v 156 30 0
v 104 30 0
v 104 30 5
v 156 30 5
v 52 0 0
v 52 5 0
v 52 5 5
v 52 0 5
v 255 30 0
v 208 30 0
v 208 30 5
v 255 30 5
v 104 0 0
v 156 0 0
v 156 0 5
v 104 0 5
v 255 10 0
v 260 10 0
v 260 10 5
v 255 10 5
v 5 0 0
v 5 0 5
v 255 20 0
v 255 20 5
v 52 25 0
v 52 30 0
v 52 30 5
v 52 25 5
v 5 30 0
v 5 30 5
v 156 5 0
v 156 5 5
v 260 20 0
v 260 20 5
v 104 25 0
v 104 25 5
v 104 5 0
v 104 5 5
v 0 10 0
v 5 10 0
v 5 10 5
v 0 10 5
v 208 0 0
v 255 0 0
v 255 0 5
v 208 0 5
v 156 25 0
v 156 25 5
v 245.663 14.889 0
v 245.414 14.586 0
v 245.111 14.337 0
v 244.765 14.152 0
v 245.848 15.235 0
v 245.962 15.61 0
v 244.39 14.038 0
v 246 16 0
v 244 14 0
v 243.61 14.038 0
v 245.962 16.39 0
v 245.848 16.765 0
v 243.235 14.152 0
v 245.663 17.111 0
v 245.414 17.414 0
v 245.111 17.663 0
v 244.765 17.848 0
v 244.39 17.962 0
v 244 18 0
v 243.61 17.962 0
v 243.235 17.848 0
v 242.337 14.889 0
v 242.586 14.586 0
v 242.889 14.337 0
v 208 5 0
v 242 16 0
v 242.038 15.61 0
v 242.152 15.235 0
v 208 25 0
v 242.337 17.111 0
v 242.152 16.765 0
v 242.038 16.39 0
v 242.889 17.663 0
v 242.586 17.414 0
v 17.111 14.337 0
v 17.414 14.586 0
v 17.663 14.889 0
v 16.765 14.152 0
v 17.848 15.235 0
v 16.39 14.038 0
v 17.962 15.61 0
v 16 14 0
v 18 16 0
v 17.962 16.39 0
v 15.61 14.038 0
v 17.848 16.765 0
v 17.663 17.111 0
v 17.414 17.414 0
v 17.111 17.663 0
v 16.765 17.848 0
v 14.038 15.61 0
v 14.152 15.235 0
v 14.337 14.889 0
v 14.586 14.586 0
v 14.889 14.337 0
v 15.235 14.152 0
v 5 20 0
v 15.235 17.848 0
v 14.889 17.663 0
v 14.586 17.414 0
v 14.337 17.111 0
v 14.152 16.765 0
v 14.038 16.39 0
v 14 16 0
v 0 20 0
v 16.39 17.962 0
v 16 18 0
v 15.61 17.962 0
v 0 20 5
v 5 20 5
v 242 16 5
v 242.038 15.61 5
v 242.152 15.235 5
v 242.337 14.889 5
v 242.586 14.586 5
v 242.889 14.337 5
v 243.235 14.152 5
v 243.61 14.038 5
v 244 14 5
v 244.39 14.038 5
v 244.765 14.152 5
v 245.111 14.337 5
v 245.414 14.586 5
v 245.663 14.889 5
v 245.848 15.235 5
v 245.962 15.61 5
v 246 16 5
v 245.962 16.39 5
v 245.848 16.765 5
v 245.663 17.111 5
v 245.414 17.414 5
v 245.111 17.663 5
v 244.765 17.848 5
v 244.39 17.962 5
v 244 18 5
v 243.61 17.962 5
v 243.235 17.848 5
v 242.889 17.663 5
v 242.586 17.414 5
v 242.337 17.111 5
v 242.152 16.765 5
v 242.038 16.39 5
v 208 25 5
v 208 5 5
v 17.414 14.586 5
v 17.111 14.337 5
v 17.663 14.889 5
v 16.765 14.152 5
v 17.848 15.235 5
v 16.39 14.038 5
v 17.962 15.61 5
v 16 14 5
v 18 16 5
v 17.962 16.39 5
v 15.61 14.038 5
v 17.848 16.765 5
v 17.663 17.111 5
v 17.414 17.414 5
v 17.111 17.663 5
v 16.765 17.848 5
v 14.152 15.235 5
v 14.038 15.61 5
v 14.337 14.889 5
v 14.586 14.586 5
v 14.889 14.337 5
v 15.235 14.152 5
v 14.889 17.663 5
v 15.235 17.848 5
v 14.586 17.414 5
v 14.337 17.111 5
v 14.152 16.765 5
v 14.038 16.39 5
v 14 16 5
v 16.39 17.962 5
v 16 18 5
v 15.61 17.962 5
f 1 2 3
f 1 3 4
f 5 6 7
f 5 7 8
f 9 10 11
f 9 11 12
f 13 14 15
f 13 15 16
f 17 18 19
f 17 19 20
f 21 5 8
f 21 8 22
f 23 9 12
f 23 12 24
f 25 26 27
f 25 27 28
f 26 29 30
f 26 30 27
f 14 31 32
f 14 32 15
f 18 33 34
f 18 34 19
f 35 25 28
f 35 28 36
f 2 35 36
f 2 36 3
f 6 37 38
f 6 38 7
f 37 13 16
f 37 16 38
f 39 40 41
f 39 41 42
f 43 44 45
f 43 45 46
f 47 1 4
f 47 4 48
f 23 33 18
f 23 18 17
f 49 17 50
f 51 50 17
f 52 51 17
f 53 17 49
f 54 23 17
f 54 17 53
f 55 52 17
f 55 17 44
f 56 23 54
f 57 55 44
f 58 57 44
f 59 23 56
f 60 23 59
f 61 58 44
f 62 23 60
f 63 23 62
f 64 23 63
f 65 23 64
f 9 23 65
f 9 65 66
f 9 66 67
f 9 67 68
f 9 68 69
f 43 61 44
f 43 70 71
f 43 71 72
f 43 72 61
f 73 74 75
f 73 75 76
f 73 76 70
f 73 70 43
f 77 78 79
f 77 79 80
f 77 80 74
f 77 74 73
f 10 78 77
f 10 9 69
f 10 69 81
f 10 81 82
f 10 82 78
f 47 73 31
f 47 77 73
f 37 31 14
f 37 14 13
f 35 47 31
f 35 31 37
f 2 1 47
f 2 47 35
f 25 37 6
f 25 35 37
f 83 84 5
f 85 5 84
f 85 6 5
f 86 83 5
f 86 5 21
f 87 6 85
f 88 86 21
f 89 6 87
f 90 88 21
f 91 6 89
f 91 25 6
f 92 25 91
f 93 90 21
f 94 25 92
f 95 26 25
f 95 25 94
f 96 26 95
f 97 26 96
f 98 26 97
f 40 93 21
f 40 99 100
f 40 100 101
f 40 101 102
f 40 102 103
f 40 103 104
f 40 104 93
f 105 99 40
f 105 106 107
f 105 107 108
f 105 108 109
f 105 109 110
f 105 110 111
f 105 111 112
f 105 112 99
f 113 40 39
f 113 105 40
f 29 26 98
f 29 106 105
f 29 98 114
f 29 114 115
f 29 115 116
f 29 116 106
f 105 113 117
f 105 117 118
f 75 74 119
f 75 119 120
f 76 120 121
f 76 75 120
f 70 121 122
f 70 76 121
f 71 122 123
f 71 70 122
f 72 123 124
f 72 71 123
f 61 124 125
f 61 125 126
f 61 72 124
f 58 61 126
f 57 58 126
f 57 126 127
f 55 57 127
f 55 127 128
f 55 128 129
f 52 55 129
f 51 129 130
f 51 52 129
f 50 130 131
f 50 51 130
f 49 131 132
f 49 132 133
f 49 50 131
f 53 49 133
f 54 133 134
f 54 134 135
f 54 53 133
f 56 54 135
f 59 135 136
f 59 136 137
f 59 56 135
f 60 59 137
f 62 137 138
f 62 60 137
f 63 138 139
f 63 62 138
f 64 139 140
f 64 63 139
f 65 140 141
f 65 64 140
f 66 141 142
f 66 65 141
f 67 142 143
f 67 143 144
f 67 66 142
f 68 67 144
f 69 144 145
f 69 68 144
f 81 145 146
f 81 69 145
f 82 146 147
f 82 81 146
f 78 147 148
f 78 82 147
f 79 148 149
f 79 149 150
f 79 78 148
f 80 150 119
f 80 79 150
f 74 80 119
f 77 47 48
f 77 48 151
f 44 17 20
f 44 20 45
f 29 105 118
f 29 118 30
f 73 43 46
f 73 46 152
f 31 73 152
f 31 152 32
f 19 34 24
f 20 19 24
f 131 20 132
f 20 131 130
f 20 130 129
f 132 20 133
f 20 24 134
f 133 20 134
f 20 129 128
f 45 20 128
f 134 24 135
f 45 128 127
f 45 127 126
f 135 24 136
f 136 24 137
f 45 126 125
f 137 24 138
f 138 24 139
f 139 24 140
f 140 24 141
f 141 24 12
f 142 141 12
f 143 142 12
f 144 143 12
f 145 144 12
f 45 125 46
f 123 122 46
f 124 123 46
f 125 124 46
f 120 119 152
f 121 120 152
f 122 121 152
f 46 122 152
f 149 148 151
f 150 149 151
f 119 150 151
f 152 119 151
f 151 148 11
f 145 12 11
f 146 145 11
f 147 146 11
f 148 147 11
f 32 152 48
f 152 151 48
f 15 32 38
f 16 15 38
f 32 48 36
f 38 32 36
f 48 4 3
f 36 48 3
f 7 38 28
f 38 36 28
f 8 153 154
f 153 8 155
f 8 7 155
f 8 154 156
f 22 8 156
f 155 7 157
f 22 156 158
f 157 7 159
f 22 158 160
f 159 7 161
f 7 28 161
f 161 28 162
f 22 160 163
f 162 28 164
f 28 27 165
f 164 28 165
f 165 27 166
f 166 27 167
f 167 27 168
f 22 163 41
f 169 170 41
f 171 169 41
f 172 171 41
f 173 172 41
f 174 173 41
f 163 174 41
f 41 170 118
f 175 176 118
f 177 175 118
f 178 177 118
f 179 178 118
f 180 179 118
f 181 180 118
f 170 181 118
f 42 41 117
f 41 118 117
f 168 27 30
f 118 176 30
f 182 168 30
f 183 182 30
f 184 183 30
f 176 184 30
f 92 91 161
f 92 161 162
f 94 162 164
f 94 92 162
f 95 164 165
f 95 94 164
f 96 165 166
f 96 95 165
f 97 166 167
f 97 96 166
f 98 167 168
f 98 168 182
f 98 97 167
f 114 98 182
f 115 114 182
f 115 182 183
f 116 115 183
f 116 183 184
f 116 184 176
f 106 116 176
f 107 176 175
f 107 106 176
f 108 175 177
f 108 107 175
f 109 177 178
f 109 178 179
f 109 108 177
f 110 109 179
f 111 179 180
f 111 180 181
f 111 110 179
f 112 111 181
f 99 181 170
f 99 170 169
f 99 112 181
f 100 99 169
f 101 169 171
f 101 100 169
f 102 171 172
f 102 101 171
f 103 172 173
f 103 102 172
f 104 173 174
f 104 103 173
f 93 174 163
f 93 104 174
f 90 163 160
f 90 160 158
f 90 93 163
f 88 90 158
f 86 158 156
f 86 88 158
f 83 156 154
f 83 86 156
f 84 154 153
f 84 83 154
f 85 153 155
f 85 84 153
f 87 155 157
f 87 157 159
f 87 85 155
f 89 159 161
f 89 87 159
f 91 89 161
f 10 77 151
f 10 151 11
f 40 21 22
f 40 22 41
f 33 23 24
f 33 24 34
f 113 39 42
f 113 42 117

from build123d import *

# Parameters (mm, degrees)
CROQUIS1_R              = 2
SALIENTE_EXTRUIR1_DEPTH = 5


with BuildPart() as part:
    # Croquis1 → Saliente-Extruir1 (new body)
    with BuildSketch(Plane.XY):
        Polygon((0, 20), (5, 20), (5, 30), (52, 30), (52, 25), (104, 25), (104, 30), (156, 30), (156, 25), (208, 25), (208, 30), (255, 30), (255, 20), (260, 20), (260, 10), (255, 10), (255, 0), (208, 0), (208, 5), (156, 5), (156, 0), (104, 0), (104, 5), (52, 5), (52, 0), (5, 0), (5, 10), (0, 10), align=None)
        with Locations((16, 16)):
            Circle(CROQUIS1_R, mode=Mode.SUBTRACT)
        with Locations(Location((244, 16, 0), (0, 0, 180))):
            Circle(CROQUIS1_R, mode=Mode.SUBTRACT)
    extrude(amount=SALIENTE_EXTRUIR1_DEPTH)


solid = part.part
